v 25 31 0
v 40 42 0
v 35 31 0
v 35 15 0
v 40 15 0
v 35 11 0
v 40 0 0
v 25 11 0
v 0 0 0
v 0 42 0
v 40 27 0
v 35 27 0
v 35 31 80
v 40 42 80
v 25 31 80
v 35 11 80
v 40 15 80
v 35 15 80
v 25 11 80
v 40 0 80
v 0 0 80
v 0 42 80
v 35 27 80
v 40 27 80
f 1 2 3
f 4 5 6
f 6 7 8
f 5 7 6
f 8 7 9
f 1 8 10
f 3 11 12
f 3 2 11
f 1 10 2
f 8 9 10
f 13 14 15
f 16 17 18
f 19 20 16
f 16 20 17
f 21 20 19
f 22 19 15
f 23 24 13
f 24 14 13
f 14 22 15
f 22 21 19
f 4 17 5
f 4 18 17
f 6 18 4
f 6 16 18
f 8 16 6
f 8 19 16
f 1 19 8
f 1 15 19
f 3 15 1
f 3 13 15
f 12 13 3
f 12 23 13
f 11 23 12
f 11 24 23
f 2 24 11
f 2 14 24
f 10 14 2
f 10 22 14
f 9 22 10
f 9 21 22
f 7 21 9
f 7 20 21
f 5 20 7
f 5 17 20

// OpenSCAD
$fn = 32;

// ----------------------------------------------------------------------
// T-slot rail: 40 x 42 mm section, 80 mm long
// ----------------------------------------------------------------------

// --- parameters (mm) ---
profile_height = 80;      // extrusion height
profile_points = 12;      // points of the closed outline

profile = [[0, 0], [40, 0], [40, 15], [35, 15], [35, 11], [25, 11], [25, 31], [35, 31], [35, 27], [40, 27], [40, 42], [0, 42]];  // single closed polygon, 12 points, counter clockwise

// --- the one profile operation ---
linear_extrude(height = profile_height) polygon(points = profile);
